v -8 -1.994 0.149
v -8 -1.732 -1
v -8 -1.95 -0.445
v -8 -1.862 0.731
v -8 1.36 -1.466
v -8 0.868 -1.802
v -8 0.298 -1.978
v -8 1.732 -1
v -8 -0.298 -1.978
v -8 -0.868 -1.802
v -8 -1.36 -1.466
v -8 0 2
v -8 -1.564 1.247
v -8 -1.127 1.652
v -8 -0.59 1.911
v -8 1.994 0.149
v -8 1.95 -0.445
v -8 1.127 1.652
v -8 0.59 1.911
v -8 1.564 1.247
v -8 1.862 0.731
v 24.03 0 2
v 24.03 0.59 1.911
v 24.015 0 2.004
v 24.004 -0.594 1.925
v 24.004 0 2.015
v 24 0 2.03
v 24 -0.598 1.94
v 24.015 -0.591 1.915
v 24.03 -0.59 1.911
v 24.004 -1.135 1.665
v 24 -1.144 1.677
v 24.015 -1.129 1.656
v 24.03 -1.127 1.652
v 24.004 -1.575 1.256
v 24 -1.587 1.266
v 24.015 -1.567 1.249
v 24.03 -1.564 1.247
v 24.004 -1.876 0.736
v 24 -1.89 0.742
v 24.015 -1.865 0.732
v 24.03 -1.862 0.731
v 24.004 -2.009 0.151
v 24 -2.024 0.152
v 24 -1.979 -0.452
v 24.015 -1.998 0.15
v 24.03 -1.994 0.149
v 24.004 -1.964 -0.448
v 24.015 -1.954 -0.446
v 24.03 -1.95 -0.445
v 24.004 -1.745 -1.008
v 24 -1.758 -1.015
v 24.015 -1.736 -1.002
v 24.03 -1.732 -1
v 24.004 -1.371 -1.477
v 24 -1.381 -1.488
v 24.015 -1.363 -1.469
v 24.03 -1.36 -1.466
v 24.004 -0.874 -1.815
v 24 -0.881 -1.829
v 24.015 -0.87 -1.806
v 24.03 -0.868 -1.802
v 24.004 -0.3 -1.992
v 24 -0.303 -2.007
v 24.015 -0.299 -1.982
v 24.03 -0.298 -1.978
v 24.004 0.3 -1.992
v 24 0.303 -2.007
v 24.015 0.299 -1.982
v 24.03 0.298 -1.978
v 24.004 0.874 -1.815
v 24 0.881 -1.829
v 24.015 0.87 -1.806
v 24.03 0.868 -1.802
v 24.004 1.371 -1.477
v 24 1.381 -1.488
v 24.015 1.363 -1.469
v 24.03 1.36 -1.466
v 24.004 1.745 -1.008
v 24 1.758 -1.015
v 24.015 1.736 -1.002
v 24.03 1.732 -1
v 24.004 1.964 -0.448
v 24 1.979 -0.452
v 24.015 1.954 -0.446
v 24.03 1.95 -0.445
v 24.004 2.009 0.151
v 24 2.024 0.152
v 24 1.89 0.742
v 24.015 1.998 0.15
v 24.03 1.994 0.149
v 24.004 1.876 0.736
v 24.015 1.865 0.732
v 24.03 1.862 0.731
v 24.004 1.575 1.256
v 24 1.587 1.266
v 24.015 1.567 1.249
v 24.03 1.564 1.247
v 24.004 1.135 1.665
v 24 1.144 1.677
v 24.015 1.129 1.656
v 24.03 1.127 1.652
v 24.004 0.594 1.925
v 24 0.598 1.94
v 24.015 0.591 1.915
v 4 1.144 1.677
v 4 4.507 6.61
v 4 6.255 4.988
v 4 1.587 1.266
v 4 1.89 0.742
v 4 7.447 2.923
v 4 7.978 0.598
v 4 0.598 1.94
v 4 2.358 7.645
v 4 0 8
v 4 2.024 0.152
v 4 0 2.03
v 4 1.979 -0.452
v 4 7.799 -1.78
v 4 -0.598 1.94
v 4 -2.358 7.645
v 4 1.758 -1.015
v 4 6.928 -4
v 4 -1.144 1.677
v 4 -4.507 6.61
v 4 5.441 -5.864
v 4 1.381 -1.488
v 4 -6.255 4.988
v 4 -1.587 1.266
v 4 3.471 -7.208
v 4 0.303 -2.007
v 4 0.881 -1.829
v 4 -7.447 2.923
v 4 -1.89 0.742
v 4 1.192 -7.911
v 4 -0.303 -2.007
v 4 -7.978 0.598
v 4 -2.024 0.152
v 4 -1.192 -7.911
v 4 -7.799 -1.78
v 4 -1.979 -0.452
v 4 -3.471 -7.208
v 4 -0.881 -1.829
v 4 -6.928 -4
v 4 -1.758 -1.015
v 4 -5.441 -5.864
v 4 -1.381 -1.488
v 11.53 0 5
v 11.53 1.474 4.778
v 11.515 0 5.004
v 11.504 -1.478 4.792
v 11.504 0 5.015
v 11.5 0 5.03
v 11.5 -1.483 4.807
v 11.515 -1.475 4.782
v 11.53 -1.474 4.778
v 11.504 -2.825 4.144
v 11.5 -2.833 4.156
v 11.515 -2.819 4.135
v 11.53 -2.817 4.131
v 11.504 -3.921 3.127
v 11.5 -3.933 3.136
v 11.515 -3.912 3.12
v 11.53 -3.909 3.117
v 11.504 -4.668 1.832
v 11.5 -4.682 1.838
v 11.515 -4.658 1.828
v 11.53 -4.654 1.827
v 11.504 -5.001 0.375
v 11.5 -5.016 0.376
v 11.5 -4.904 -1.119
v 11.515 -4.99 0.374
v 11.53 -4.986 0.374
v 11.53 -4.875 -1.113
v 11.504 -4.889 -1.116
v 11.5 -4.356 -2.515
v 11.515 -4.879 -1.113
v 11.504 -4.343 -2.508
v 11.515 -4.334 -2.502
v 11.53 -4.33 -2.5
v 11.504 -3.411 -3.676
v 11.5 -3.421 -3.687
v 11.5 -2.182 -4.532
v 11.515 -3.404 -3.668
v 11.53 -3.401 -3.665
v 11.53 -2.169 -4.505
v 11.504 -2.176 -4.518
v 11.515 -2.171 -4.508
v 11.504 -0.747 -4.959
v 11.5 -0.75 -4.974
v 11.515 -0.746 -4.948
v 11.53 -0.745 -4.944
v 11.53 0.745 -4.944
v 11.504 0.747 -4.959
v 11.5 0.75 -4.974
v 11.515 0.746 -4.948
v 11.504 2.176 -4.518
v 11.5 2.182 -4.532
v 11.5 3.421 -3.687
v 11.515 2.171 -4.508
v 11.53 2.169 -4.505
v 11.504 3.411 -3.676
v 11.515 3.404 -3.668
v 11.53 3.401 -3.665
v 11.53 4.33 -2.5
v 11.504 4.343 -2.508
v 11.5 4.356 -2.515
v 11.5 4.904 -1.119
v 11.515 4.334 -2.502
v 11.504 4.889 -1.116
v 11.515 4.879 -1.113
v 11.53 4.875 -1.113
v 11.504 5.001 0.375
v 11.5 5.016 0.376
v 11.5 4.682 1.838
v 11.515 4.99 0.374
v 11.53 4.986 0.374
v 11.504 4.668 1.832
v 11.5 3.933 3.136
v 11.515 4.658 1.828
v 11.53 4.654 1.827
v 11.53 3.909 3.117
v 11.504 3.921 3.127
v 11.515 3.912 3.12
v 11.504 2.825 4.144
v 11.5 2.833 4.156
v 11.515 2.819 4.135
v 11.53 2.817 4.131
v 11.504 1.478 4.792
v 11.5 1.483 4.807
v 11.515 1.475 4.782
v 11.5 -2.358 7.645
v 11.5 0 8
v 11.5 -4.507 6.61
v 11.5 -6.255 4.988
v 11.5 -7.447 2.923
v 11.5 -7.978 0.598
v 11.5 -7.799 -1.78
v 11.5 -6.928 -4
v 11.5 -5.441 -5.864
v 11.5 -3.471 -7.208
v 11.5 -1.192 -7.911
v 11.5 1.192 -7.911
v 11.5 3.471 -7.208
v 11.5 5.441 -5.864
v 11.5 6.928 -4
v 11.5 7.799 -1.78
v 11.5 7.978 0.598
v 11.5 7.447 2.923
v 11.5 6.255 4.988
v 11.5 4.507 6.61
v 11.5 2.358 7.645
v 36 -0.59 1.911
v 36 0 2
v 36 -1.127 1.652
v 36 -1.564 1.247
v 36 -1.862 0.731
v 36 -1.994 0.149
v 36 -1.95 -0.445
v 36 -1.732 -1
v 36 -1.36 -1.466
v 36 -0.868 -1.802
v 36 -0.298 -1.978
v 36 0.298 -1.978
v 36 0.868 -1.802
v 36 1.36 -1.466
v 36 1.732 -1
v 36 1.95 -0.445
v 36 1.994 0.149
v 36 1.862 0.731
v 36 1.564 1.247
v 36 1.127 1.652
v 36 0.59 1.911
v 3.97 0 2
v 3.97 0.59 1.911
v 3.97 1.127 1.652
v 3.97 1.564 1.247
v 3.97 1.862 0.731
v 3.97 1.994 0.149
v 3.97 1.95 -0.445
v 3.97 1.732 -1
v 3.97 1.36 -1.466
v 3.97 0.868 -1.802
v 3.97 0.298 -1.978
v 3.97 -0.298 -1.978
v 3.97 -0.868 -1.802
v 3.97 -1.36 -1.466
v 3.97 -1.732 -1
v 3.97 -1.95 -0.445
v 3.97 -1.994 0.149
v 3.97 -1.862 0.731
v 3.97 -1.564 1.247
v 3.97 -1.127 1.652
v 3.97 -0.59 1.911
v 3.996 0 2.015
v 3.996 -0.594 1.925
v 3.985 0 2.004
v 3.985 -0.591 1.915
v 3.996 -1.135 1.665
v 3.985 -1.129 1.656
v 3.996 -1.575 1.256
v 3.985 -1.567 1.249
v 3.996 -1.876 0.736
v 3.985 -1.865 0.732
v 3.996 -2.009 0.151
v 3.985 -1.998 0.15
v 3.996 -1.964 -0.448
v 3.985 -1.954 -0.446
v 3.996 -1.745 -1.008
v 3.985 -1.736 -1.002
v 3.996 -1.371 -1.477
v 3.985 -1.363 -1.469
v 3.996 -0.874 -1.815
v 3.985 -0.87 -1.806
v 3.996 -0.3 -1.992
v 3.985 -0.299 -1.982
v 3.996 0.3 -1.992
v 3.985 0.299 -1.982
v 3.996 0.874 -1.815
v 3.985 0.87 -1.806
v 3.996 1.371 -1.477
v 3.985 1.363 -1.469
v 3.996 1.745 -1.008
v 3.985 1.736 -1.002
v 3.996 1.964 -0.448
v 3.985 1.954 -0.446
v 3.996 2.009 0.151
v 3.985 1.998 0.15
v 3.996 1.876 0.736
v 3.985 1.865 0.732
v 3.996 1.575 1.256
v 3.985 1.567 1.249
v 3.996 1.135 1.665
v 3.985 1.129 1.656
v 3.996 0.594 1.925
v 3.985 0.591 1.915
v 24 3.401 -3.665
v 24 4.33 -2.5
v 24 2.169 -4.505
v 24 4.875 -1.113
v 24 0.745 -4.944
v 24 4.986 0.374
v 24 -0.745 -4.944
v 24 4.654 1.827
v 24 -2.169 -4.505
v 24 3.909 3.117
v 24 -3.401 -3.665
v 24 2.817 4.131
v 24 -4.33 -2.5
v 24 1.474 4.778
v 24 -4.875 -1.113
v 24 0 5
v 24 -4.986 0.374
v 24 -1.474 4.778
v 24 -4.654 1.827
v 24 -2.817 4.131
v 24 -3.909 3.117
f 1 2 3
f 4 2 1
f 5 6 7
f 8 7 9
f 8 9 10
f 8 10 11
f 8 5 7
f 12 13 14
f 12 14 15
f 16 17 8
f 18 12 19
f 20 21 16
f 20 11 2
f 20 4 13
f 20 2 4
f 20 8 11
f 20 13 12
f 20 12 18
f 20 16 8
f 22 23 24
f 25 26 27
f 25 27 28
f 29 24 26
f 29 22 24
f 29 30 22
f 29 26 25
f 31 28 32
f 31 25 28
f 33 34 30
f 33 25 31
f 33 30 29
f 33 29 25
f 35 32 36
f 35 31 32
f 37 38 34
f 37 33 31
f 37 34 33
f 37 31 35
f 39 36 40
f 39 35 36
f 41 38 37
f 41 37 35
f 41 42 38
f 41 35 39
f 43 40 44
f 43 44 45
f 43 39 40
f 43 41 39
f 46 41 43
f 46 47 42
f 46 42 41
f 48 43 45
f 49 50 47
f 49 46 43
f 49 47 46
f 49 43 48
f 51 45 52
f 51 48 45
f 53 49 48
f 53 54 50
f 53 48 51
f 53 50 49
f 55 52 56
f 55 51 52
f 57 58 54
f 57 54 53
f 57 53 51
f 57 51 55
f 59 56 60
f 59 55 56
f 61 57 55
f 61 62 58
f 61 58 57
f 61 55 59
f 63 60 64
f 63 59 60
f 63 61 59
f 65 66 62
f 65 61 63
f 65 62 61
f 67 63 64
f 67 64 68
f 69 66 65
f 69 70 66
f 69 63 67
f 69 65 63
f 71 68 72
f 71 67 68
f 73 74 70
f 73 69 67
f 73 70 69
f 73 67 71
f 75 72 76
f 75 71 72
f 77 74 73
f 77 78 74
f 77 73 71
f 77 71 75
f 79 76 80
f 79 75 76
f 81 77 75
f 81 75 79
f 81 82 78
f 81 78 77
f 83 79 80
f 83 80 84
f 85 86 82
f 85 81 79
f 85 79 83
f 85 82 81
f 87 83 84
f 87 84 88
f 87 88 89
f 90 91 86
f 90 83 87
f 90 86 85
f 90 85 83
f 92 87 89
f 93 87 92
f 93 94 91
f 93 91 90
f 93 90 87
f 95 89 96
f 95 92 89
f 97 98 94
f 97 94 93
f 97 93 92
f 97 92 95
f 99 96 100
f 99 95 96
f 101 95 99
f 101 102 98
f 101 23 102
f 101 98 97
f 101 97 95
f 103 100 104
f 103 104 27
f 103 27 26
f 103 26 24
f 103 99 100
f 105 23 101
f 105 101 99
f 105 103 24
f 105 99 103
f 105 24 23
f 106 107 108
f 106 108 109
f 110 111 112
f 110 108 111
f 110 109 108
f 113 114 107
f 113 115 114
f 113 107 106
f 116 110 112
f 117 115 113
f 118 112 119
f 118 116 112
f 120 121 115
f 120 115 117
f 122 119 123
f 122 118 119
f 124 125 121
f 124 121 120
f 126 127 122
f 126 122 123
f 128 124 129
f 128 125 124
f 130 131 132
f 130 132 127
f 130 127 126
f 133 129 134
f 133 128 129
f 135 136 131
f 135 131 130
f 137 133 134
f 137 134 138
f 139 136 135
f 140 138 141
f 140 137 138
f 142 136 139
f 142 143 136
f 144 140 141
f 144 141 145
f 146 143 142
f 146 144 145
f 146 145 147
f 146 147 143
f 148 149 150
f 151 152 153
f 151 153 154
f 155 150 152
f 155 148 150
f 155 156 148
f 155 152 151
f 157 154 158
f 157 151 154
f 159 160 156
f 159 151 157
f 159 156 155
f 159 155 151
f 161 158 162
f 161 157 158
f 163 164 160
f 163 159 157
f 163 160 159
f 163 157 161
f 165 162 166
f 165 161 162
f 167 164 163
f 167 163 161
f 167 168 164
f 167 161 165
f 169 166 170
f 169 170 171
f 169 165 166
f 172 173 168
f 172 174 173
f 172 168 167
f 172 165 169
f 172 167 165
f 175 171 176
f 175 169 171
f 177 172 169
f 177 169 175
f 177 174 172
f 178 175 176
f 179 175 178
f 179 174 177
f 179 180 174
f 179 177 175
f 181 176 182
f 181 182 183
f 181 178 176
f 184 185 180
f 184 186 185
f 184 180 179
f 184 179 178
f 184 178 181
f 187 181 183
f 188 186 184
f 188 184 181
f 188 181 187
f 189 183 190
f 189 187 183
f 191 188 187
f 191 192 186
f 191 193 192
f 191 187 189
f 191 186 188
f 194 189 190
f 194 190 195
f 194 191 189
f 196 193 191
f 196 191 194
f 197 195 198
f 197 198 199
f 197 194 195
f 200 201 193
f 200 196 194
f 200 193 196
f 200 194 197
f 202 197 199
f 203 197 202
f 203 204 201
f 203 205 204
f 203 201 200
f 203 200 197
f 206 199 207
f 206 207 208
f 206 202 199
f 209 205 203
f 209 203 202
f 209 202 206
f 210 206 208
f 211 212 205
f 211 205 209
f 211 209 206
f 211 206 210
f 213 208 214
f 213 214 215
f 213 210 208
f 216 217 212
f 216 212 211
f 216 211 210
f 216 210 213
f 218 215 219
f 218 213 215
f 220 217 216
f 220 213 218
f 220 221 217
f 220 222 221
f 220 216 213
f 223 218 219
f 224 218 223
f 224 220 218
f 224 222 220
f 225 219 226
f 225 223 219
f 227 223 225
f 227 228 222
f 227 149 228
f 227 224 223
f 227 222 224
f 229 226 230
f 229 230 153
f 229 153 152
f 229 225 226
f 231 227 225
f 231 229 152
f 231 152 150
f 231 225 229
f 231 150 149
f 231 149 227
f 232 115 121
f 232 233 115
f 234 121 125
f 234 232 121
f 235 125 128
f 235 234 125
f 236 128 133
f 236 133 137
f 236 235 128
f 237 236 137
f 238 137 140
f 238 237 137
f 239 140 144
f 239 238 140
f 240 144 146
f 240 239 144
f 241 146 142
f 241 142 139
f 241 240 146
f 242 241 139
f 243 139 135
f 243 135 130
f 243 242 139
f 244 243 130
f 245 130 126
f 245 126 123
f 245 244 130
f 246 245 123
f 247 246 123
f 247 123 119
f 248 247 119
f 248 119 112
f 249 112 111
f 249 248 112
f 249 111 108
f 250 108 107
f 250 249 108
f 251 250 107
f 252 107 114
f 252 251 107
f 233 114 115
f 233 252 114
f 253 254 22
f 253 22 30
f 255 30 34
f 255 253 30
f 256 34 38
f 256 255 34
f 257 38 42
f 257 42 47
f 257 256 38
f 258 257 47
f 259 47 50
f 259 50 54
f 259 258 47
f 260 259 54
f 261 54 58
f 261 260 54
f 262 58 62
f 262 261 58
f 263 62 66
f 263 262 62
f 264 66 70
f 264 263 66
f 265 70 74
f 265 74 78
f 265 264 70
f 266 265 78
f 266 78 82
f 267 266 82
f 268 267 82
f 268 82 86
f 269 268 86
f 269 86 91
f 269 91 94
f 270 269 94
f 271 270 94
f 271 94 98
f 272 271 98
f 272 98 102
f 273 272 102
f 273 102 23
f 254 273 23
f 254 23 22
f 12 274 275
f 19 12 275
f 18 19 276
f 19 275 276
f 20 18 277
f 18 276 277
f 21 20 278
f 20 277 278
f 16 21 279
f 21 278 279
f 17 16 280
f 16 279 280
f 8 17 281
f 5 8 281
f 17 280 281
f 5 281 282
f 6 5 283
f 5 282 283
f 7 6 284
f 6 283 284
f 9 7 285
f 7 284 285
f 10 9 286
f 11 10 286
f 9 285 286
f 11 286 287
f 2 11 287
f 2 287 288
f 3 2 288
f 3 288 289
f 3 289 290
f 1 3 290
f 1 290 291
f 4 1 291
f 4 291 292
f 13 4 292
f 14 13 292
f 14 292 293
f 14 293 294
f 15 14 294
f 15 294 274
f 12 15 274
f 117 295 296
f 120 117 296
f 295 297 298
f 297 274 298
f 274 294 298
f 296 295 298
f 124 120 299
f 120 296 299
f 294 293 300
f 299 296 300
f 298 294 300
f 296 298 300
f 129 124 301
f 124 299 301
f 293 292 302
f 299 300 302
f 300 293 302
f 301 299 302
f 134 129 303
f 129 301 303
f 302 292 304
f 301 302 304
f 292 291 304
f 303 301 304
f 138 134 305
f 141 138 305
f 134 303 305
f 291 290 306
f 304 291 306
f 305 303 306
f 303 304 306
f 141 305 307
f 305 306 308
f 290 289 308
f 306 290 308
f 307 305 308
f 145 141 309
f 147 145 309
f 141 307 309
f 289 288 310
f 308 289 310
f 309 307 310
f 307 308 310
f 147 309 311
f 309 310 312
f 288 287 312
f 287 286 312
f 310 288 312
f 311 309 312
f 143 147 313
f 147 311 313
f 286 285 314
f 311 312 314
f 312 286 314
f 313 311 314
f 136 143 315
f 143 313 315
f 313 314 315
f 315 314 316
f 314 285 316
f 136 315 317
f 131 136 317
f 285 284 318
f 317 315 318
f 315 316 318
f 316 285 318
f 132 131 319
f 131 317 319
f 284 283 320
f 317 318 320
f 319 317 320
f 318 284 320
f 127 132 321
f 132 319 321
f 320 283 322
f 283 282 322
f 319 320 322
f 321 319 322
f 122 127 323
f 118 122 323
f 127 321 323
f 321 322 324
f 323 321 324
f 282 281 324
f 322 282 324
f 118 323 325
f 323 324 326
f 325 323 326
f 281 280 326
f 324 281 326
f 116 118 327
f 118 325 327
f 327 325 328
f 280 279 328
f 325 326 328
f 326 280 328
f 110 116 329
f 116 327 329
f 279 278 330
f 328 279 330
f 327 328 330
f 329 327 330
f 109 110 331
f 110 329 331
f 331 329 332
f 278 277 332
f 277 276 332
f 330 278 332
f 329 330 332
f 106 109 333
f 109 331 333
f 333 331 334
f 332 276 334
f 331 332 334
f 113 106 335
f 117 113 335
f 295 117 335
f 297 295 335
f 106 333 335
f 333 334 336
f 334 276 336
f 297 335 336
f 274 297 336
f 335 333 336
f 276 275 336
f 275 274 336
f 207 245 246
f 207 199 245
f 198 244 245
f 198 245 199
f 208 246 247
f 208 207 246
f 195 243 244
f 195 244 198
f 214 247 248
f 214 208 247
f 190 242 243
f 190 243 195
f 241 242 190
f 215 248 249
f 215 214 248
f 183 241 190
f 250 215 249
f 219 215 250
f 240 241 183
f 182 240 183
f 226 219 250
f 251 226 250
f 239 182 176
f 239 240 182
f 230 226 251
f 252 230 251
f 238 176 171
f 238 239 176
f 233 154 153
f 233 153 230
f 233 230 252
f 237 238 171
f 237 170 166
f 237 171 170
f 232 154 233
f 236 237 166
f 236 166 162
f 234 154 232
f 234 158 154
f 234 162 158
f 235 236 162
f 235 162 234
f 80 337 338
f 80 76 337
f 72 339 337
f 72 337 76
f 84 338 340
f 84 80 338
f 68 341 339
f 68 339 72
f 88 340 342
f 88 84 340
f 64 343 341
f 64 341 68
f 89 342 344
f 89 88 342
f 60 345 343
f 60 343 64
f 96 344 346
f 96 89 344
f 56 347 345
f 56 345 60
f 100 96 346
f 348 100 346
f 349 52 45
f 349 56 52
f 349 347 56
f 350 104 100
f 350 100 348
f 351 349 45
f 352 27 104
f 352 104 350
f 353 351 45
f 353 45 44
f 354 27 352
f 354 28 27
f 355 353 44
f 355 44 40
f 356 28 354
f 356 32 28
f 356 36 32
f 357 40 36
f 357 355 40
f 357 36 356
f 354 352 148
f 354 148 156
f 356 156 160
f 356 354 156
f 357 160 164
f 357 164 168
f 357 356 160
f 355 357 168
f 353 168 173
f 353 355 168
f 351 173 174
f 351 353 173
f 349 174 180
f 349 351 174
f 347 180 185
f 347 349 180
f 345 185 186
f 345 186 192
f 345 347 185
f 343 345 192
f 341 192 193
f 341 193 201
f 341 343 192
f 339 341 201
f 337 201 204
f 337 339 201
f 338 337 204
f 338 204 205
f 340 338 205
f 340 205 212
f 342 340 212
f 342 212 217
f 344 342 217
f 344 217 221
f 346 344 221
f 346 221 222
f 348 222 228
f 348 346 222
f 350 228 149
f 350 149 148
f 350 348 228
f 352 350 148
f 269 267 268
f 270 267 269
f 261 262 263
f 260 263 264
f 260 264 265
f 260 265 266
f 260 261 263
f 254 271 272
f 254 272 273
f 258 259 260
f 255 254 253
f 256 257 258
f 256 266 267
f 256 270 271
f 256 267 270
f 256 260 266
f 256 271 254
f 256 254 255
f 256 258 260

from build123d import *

# Parameters (mm, degrees)
CROQUIS2_R              = 2
SALIENTE_EXTRUIR1_DEPTH = 8
CROQUIS3_R              = 2
SALIENTE_EXTRUIR2_DEPTH = 8
REDONDEO1_R             = 0.03
REDONDEO2_R             = 0.03


with BuildPart() as part:
    # Croquis1 → Revolución1 (revolve)
    with BuildSketch(Plane.XY, mode=Mode.PRIVATE) as revoluci_n1_sk:
        Polygon((0, 0), (0, 2), (4, 2), (4, 8), (11.5, 8), (11.5, 5), (24, 5), (24, 2), (28, 2), (28, 0), align=None)
    revolve(revoluci_n1_sk.sketch.rotate(Axis((0, 0, 0), (1, 0, 0)), 90), axis=Axis((0, 0, 0), (1, 0, 0)))

    # Croquis2 → Saliente-Extruir1 (add)
    with BuildSketch(Plane.ZY):
        Circle(CROQUIS2_R)
    extrude(amount=SALIENTE_EXTRUIR1_DEPTH)

    # Croquis3 → Saliente-Extruir2 (add)
    with BuildSketch(Plane(origin=(28, 0, 0), x_dir=(0, 0, -1), z_dir=(1, 0, 0))):
        with Locations(Location((0, 0, 0), (0, 0, 180))):
            Circle(CROQUIS3_R)
    extrude(amount=SALIENTE_EXTRUIR2_DEPTH)

    # Redondeo1
    redondeo1_edges = [part.edges().sort_by_distance(p)[0] for p in [
        (4, 0, -2),
    ]]
    fillet(redondeo1_edges, radius=REDONDEO1_R)

    # Redondeo2
    redondeo2_edges = [part.edges().sort_by_distance(p)[0] for p in [
        (11.5, 0, -5),
        (24, 0, -2),
    ]]
    fillet(redondeo2_edges, radius=REDONDEO2_R)


solid = part.part
